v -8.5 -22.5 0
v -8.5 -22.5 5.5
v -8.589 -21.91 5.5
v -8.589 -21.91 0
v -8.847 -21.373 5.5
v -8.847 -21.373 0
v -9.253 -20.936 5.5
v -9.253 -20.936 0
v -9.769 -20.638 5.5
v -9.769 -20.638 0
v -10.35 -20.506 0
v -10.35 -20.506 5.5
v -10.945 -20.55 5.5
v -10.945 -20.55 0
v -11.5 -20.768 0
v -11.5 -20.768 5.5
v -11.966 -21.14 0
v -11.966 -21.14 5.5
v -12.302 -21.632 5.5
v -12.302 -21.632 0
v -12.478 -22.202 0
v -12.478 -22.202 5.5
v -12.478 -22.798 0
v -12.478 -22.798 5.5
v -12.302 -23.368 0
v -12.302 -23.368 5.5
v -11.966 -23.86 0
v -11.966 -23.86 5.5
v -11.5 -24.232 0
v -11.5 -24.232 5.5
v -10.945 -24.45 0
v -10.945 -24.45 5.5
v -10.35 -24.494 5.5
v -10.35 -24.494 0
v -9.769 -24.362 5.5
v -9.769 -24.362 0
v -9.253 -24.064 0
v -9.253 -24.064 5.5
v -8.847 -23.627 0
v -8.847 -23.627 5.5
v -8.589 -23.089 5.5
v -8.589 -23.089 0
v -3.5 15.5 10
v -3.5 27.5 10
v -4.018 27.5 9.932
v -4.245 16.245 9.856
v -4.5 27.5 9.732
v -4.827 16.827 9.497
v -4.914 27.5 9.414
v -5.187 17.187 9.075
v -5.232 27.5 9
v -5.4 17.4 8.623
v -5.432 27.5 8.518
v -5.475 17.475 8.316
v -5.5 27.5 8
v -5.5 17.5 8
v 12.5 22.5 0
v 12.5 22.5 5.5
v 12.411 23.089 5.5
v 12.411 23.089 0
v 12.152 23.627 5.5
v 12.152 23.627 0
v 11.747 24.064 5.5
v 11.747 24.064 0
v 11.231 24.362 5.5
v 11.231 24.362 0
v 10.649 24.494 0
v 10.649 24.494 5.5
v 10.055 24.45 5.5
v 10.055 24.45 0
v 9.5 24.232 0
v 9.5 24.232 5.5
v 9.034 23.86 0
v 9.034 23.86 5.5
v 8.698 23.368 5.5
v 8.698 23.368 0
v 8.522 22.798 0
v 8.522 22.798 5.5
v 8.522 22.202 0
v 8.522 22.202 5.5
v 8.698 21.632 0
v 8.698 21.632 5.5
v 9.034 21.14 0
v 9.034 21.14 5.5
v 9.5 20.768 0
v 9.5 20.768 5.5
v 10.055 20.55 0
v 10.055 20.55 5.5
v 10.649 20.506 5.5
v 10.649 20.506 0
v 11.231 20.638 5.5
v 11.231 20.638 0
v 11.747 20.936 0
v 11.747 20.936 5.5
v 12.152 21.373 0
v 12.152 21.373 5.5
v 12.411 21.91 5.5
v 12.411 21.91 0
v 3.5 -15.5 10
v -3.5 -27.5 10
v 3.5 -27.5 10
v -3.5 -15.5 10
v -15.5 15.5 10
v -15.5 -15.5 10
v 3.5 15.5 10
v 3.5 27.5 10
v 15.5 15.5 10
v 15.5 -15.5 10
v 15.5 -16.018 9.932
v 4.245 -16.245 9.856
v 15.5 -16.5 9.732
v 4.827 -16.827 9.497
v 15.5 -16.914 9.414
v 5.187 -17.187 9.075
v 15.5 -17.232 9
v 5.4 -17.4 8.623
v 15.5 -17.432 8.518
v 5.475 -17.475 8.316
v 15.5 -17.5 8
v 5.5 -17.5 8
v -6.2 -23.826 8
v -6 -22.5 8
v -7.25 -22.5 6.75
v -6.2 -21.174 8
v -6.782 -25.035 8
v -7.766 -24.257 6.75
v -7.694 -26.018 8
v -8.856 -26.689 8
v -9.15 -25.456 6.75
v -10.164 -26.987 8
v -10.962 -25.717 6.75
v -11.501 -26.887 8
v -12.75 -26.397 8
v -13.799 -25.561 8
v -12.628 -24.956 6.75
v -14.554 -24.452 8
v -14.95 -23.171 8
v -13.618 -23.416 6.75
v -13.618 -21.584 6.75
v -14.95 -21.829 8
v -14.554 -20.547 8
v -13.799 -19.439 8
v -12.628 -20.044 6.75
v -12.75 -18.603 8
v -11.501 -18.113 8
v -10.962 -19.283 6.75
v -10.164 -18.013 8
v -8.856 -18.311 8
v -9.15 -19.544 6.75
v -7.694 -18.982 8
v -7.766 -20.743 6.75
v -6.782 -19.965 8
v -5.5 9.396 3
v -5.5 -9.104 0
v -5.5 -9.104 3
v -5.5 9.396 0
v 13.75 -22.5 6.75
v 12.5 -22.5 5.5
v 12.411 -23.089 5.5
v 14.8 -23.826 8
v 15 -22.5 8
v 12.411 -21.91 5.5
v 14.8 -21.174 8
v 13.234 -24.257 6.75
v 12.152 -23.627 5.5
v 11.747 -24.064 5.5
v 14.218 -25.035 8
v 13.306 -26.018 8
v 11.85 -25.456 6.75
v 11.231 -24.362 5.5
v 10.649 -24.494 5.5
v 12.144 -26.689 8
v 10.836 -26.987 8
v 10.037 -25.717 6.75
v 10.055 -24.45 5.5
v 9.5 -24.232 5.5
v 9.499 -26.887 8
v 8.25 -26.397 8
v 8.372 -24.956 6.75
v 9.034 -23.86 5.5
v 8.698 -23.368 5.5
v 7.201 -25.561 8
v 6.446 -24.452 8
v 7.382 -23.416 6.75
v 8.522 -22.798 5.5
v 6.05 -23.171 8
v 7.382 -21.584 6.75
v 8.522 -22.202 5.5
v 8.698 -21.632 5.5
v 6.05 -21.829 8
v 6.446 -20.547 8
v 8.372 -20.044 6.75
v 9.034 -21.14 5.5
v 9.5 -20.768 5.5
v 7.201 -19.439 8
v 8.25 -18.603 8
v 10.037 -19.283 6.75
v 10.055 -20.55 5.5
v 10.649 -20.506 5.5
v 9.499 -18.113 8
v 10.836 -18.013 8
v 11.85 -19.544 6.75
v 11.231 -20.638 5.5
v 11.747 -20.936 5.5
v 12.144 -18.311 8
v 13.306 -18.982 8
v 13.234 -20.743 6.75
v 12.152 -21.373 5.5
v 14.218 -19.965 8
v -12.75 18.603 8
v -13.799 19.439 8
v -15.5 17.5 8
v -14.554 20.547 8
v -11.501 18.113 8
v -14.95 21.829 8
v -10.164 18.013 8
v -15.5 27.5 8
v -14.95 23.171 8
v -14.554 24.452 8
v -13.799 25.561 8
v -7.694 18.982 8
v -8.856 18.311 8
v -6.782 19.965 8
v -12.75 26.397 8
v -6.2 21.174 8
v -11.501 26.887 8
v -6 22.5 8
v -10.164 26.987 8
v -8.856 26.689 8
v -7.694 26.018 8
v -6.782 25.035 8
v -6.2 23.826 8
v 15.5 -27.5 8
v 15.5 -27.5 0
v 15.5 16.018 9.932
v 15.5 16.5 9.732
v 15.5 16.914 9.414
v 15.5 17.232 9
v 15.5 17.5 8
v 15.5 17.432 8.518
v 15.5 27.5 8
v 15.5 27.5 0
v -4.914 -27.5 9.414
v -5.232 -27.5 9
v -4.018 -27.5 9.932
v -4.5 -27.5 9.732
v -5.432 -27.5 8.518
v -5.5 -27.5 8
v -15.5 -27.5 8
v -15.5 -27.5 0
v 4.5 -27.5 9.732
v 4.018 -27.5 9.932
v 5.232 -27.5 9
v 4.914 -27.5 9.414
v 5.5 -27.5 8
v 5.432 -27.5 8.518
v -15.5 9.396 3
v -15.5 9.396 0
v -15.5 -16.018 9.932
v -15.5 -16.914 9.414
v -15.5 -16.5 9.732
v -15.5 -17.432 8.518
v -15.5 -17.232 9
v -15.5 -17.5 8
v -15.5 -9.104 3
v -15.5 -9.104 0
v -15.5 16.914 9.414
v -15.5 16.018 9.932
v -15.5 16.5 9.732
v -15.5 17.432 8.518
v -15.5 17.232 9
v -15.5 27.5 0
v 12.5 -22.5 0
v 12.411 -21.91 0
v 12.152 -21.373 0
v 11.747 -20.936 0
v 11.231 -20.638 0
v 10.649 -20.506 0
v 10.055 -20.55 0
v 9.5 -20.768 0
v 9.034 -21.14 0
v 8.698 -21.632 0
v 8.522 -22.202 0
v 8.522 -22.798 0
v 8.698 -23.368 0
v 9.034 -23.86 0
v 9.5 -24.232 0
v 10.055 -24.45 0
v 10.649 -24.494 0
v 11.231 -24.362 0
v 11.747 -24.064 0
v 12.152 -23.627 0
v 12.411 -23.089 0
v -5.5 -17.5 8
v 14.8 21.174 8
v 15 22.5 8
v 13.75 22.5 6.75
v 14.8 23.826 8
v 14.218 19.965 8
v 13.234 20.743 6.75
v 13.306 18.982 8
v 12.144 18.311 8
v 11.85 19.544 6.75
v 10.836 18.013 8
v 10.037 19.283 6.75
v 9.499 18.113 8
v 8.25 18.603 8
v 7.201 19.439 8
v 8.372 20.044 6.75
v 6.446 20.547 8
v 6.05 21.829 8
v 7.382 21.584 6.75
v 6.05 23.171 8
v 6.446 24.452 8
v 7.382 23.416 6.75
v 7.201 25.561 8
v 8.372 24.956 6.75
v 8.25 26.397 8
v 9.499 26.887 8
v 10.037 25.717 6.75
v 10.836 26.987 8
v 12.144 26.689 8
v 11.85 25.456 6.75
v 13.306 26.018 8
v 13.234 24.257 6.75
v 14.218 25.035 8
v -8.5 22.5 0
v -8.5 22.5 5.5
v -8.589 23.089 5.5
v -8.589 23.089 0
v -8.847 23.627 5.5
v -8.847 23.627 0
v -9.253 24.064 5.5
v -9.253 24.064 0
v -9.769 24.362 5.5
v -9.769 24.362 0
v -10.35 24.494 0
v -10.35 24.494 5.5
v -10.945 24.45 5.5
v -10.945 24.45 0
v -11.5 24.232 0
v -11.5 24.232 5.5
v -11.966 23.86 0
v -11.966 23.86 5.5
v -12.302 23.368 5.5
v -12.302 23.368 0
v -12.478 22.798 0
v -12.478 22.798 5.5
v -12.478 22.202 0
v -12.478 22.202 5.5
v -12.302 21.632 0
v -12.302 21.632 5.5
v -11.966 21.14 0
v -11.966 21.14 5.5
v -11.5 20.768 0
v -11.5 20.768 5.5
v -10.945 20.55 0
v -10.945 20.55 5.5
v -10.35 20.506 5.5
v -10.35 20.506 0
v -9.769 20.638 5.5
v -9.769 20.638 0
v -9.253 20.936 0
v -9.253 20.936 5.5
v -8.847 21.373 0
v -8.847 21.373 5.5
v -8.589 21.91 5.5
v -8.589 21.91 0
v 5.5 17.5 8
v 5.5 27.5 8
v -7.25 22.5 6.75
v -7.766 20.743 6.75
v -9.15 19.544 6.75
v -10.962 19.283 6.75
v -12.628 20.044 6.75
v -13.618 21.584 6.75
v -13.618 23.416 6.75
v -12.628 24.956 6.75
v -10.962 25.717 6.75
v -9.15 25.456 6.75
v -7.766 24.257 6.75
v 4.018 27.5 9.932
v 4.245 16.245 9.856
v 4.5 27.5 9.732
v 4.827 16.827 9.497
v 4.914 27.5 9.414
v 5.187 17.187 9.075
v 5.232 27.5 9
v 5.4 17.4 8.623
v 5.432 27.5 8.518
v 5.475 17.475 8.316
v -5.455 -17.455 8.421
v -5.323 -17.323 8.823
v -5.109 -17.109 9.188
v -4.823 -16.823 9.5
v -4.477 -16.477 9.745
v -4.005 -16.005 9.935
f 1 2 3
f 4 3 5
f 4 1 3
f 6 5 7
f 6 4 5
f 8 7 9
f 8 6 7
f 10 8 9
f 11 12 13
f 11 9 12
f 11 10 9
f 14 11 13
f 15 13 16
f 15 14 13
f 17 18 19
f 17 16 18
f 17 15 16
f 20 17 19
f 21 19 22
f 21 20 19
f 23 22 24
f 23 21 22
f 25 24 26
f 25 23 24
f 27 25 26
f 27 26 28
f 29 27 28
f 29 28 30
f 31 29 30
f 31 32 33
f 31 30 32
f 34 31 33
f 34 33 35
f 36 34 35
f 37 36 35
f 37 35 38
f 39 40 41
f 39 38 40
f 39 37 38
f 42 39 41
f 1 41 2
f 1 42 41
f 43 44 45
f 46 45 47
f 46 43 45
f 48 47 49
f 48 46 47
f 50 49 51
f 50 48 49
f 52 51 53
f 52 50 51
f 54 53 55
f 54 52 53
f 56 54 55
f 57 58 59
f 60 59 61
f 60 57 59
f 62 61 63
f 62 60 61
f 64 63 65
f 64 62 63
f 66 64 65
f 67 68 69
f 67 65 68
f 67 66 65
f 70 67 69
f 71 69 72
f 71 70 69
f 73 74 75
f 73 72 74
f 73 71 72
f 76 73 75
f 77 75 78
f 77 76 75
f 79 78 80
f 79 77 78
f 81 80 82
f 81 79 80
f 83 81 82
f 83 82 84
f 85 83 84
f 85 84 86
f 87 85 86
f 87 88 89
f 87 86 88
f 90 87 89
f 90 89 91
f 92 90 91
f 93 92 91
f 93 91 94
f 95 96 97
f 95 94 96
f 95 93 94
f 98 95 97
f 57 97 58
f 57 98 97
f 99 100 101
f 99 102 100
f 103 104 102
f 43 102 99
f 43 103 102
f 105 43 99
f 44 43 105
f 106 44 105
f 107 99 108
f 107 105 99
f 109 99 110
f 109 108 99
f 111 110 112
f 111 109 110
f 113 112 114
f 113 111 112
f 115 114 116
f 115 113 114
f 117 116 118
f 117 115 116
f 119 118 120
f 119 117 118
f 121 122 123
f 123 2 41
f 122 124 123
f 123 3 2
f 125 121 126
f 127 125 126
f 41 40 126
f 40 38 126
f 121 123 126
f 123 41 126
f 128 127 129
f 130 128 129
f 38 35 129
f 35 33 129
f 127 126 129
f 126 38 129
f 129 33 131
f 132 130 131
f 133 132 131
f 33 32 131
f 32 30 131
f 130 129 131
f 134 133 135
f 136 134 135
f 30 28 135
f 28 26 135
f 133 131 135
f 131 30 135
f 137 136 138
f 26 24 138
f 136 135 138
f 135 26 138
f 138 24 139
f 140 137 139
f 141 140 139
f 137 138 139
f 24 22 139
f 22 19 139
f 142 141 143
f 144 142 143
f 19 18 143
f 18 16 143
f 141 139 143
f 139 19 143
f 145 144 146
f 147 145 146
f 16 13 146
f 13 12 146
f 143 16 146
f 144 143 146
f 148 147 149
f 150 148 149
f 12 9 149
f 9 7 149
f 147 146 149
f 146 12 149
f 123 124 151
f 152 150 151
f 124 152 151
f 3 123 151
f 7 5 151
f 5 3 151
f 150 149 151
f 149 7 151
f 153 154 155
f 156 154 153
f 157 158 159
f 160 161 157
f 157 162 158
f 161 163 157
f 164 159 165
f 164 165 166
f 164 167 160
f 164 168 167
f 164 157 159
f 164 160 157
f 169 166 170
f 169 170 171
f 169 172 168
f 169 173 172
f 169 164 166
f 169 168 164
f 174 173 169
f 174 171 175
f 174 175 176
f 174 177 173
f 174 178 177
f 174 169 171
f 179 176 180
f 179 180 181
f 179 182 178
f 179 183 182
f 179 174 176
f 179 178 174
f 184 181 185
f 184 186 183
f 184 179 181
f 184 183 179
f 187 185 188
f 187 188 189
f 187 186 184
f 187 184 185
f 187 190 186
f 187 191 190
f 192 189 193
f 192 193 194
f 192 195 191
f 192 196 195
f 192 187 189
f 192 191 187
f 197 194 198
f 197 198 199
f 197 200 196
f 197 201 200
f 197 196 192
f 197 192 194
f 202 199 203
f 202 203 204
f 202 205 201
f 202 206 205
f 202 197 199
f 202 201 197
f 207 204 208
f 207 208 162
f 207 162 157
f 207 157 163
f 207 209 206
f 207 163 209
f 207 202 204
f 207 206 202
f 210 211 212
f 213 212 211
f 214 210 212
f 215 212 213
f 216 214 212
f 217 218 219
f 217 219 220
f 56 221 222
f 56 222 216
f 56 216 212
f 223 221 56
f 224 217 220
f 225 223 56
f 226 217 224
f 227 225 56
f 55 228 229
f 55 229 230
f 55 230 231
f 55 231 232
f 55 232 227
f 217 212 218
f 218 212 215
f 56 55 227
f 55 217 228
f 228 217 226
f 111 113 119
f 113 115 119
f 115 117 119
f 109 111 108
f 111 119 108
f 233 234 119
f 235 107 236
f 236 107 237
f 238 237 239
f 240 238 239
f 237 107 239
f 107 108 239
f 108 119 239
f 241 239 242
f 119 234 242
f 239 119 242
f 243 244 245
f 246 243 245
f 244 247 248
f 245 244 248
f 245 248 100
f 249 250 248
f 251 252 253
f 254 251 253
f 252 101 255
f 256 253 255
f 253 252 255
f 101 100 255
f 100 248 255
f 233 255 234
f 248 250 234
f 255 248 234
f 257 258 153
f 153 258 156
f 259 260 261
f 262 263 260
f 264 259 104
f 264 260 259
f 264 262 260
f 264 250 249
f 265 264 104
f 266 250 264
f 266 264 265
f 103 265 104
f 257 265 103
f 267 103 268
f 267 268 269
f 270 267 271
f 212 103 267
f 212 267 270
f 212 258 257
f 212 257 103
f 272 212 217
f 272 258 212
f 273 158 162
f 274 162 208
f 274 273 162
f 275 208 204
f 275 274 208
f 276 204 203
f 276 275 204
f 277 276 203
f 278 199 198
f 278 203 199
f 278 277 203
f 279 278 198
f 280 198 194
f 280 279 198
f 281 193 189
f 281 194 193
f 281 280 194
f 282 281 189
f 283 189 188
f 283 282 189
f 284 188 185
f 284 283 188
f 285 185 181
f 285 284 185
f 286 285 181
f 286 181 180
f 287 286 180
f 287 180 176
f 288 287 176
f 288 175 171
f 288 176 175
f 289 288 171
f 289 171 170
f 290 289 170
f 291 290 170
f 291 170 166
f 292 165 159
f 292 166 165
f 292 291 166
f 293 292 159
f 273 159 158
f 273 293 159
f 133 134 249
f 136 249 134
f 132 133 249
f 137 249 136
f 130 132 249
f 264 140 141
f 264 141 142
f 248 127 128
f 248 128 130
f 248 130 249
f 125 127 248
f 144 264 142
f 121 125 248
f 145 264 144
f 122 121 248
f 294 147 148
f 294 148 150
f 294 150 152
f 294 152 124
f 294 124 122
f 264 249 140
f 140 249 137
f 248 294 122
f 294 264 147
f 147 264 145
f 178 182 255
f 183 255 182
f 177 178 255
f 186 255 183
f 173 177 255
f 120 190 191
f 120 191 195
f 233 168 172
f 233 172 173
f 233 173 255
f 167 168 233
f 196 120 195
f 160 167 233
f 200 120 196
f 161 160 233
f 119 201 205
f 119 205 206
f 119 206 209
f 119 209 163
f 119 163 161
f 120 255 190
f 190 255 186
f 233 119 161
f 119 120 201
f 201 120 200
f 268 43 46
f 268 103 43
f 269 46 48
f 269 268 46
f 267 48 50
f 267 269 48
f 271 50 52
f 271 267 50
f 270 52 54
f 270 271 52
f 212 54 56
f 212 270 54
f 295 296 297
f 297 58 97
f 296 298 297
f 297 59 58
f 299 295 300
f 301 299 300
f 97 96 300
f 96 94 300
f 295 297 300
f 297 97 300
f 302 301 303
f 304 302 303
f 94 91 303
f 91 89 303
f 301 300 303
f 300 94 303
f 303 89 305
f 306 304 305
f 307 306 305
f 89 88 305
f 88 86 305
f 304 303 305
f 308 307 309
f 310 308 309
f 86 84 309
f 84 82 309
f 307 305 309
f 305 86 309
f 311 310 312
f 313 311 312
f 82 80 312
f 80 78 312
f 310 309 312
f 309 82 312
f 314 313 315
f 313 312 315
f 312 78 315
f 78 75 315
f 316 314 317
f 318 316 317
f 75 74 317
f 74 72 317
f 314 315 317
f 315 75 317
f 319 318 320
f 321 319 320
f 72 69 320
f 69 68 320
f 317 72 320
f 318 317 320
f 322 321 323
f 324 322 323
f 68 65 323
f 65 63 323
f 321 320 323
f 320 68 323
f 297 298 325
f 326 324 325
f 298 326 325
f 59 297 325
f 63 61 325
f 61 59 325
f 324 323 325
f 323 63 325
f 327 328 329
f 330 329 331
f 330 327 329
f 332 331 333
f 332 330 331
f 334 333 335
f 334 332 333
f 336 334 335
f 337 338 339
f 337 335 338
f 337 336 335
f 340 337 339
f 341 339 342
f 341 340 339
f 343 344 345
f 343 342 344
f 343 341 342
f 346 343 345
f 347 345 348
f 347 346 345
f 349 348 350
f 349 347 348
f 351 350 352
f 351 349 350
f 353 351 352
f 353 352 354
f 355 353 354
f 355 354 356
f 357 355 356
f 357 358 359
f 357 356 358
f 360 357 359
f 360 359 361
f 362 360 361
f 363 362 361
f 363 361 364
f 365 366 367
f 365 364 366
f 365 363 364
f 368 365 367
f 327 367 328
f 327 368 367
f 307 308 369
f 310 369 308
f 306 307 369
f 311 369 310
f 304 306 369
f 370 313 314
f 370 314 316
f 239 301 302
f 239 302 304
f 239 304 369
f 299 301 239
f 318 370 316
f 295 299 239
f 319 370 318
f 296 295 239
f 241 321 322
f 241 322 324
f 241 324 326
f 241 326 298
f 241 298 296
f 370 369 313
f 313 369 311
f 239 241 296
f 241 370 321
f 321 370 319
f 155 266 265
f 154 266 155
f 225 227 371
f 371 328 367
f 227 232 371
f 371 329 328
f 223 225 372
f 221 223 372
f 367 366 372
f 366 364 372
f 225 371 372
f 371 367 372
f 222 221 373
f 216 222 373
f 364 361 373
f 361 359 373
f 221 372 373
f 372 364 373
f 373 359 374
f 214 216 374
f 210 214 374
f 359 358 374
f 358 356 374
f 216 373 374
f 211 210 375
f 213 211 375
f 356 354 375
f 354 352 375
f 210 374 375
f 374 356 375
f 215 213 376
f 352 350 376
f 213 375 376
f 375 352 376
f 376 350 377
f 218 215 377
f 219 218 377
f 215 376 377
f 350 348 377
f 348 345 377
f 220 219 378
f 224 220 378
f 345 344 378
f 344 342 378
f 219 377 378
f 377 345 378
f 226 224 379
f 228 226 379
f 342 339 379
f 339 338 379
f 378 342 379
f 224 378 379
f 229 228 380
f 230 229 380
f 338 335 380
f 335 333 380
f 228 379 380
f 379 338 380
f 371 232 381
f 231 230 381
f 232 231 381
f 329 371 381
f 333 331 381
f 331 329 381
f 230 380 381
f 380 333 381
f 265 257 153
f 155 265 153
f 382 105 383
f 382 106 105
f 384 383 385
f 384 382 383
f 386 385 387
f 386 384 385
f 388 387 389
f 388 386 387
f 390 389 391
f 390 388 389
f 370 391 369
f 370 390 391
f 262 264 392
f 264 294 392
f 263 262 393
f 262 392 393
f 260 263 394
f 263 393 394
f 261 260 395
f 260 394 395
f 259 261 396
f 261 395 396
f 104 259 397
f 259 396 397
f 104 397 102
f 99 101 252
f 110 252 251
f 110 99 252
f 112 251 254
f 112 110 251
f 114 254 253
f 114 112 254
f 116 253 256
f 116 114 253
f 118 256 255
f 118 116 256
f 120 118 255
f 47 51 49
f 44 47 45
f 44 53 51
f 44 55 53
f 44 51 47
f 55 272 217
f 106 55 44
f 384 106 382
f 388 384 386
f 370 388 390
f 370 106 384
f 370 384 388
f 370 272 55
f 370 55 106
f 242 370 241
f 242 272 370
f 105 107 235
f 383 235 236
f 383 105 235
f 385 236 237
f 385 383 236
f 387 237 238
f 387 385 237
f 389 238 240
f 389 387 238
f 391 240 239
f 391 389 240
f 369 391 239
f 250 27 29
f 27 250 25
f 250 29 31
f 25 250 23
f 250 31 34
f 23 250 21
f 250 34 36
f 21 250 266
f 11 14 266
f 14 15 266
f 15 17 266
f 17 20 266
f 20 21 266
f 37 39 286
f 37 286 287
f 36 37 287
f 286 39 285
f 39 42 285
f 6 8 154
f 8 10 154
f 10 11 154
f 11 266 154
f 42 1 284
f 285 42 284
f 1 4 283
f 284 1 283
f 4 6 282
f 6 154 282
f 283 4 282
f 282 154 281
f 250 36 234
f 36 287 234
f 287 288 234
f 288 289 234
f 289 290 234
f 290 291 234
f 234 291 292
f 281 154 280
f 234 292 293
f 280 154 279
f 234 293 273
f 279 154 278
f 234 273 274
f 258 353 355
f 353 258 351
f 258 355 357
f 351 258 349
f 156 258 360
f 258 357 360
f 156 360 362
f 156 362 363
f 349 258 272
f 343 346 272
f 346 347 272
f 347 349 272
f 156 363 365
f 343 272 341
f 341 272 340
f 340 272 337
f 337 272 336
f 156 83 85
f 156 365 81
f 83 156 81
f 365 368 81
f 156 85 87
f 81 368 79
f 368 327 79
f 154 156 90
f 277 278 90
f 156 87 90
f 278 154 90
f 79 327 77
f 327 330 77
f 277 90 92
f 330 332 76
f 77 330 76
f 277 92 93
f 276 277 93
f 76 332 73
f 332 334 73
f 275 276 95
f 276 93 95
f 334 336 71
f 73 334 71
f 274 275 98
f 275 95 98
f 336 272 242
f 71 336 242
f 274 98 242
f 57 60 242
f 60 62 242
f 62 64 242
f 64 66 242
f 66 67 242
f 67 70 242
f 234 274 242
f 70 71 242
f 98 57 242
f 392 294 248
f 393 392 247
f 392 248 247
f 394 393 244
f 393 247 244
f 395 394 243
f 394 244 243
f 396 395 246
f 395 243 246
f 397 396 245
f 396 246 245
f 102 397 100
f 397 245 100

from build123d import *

# Parameters (mm, degrees)
F0_W     = 10
F0_H     = 18.5
F2_DEPTH = 10
F3_DEPTH = 3
F0_H_2   = 10
F4_DEPTH = 8
F1_R     = 2
F5_DEPTH = 25
F6_SIZE  = 2.5
F7_R     = 1.99999


# Not quite as in the source:
# - a fillet or chamfer is up to 0.001 mm smaller than in the source, because OpenCascade refuses the exact size


with BuildPart() as f2:
    # F0 (on Top) → F2 (new body)
    with BuildSketch(Plane.XY):
        with Locations((-10.5, 0.1457649022)):
            Rectangle(F0_W, F0_H)
        Polygon((5.5, 17.5), (5.5, 27.5), (-5.5, 27.5), (-5.5, 17.5), (-15.5, 17.5), (-15.5, 9.3957649022), (-5.5, 9.3957649022), (-5.5, -9.1042350978), (-15.5, -9.1042350978), (-15.5, -17.5), (-5.5, -17.5), (-5.5, -27.5), (5.5, -27.5), (5.5, -17.5), (15.5, -17.5), (15.5, 17.5), align=None)
    extrude(amount=F2_DEPTH)

    # F0 (on Top) → F3 (cut)
    with BuildSketch(Plane.XY):
        with Locations((-10.5, 0.1457649022)):
            Rectangle(F0_W, F0_H)
    extrude(amount=F3_DEPTH, mode=Mode.SUBTRACT)

    # F0 (on Top) → F4 (join)
    with BuildSketch(Plane.XY):
        with Locations((-10.5, 22.5)):
            Rectangle(F0_W, F0_H_2)
        with Locations((10.5, 22.5)):
            Rectangle(F0_W, F0_H_2)
        with Locations((-10.5, -22.5)):
            Rectangle(F0_W, F0_H_2)
        with Locations((10.5, -22.5)):
            Rectangle(F0_W, F0_H_2)
    extrude(amount=F4_DEPTH)

    # F1 (on Top) → F5 (cut)
    with BuildSketch(Plane.XY):
        with Locations((-10.4999503866, 22.4999412894)):
            Circle(F1_R)
        with Locations((10.4999503866, 22.4999412894)):
            Circle(F1_R)
        with Locations((-10.4999503866, -22.4999412894)):
            Circle(F1_R)
        with Locations((10.4999503866, -22.4999412894)):
            Circle(F1_R)
    extrude(amount=F5_DEPTH, mode=Mode.SUBTRACT)

    # F6
    f6_edges = [f2.edges().sort_by_distance(p)[0] for p in [
        (-12.49995, 22.499941, 8),
        (8.49995, 22.499941, 8),
        (8.49995, -22.499941, 8),
        (-12.49995, -22.499941, 8),
    ]]
    chamfer(f6_edges, length=F6_SIZE)

    # F7 (radius 2 in the source; OpenCascade refuses exactly that, so slightly less here)
    f7_edges = [f2.edges().sort_by_distance(p)[0] for p in [
        (-10.5, -17.5, 10),
        (-5.5, -22.5, 10),
        (-10.5, 17.5, 10),
        (-5.5, 22.5, 10),
        (5.5, 22.5, 10),
        (10.5, 17.5, 10),
        (10.5, -17.5, 10),
        (5.5, -22.5, 10),
    ]]
    fillet(f7_edges, radius=F7_R)


solid = f2.part
